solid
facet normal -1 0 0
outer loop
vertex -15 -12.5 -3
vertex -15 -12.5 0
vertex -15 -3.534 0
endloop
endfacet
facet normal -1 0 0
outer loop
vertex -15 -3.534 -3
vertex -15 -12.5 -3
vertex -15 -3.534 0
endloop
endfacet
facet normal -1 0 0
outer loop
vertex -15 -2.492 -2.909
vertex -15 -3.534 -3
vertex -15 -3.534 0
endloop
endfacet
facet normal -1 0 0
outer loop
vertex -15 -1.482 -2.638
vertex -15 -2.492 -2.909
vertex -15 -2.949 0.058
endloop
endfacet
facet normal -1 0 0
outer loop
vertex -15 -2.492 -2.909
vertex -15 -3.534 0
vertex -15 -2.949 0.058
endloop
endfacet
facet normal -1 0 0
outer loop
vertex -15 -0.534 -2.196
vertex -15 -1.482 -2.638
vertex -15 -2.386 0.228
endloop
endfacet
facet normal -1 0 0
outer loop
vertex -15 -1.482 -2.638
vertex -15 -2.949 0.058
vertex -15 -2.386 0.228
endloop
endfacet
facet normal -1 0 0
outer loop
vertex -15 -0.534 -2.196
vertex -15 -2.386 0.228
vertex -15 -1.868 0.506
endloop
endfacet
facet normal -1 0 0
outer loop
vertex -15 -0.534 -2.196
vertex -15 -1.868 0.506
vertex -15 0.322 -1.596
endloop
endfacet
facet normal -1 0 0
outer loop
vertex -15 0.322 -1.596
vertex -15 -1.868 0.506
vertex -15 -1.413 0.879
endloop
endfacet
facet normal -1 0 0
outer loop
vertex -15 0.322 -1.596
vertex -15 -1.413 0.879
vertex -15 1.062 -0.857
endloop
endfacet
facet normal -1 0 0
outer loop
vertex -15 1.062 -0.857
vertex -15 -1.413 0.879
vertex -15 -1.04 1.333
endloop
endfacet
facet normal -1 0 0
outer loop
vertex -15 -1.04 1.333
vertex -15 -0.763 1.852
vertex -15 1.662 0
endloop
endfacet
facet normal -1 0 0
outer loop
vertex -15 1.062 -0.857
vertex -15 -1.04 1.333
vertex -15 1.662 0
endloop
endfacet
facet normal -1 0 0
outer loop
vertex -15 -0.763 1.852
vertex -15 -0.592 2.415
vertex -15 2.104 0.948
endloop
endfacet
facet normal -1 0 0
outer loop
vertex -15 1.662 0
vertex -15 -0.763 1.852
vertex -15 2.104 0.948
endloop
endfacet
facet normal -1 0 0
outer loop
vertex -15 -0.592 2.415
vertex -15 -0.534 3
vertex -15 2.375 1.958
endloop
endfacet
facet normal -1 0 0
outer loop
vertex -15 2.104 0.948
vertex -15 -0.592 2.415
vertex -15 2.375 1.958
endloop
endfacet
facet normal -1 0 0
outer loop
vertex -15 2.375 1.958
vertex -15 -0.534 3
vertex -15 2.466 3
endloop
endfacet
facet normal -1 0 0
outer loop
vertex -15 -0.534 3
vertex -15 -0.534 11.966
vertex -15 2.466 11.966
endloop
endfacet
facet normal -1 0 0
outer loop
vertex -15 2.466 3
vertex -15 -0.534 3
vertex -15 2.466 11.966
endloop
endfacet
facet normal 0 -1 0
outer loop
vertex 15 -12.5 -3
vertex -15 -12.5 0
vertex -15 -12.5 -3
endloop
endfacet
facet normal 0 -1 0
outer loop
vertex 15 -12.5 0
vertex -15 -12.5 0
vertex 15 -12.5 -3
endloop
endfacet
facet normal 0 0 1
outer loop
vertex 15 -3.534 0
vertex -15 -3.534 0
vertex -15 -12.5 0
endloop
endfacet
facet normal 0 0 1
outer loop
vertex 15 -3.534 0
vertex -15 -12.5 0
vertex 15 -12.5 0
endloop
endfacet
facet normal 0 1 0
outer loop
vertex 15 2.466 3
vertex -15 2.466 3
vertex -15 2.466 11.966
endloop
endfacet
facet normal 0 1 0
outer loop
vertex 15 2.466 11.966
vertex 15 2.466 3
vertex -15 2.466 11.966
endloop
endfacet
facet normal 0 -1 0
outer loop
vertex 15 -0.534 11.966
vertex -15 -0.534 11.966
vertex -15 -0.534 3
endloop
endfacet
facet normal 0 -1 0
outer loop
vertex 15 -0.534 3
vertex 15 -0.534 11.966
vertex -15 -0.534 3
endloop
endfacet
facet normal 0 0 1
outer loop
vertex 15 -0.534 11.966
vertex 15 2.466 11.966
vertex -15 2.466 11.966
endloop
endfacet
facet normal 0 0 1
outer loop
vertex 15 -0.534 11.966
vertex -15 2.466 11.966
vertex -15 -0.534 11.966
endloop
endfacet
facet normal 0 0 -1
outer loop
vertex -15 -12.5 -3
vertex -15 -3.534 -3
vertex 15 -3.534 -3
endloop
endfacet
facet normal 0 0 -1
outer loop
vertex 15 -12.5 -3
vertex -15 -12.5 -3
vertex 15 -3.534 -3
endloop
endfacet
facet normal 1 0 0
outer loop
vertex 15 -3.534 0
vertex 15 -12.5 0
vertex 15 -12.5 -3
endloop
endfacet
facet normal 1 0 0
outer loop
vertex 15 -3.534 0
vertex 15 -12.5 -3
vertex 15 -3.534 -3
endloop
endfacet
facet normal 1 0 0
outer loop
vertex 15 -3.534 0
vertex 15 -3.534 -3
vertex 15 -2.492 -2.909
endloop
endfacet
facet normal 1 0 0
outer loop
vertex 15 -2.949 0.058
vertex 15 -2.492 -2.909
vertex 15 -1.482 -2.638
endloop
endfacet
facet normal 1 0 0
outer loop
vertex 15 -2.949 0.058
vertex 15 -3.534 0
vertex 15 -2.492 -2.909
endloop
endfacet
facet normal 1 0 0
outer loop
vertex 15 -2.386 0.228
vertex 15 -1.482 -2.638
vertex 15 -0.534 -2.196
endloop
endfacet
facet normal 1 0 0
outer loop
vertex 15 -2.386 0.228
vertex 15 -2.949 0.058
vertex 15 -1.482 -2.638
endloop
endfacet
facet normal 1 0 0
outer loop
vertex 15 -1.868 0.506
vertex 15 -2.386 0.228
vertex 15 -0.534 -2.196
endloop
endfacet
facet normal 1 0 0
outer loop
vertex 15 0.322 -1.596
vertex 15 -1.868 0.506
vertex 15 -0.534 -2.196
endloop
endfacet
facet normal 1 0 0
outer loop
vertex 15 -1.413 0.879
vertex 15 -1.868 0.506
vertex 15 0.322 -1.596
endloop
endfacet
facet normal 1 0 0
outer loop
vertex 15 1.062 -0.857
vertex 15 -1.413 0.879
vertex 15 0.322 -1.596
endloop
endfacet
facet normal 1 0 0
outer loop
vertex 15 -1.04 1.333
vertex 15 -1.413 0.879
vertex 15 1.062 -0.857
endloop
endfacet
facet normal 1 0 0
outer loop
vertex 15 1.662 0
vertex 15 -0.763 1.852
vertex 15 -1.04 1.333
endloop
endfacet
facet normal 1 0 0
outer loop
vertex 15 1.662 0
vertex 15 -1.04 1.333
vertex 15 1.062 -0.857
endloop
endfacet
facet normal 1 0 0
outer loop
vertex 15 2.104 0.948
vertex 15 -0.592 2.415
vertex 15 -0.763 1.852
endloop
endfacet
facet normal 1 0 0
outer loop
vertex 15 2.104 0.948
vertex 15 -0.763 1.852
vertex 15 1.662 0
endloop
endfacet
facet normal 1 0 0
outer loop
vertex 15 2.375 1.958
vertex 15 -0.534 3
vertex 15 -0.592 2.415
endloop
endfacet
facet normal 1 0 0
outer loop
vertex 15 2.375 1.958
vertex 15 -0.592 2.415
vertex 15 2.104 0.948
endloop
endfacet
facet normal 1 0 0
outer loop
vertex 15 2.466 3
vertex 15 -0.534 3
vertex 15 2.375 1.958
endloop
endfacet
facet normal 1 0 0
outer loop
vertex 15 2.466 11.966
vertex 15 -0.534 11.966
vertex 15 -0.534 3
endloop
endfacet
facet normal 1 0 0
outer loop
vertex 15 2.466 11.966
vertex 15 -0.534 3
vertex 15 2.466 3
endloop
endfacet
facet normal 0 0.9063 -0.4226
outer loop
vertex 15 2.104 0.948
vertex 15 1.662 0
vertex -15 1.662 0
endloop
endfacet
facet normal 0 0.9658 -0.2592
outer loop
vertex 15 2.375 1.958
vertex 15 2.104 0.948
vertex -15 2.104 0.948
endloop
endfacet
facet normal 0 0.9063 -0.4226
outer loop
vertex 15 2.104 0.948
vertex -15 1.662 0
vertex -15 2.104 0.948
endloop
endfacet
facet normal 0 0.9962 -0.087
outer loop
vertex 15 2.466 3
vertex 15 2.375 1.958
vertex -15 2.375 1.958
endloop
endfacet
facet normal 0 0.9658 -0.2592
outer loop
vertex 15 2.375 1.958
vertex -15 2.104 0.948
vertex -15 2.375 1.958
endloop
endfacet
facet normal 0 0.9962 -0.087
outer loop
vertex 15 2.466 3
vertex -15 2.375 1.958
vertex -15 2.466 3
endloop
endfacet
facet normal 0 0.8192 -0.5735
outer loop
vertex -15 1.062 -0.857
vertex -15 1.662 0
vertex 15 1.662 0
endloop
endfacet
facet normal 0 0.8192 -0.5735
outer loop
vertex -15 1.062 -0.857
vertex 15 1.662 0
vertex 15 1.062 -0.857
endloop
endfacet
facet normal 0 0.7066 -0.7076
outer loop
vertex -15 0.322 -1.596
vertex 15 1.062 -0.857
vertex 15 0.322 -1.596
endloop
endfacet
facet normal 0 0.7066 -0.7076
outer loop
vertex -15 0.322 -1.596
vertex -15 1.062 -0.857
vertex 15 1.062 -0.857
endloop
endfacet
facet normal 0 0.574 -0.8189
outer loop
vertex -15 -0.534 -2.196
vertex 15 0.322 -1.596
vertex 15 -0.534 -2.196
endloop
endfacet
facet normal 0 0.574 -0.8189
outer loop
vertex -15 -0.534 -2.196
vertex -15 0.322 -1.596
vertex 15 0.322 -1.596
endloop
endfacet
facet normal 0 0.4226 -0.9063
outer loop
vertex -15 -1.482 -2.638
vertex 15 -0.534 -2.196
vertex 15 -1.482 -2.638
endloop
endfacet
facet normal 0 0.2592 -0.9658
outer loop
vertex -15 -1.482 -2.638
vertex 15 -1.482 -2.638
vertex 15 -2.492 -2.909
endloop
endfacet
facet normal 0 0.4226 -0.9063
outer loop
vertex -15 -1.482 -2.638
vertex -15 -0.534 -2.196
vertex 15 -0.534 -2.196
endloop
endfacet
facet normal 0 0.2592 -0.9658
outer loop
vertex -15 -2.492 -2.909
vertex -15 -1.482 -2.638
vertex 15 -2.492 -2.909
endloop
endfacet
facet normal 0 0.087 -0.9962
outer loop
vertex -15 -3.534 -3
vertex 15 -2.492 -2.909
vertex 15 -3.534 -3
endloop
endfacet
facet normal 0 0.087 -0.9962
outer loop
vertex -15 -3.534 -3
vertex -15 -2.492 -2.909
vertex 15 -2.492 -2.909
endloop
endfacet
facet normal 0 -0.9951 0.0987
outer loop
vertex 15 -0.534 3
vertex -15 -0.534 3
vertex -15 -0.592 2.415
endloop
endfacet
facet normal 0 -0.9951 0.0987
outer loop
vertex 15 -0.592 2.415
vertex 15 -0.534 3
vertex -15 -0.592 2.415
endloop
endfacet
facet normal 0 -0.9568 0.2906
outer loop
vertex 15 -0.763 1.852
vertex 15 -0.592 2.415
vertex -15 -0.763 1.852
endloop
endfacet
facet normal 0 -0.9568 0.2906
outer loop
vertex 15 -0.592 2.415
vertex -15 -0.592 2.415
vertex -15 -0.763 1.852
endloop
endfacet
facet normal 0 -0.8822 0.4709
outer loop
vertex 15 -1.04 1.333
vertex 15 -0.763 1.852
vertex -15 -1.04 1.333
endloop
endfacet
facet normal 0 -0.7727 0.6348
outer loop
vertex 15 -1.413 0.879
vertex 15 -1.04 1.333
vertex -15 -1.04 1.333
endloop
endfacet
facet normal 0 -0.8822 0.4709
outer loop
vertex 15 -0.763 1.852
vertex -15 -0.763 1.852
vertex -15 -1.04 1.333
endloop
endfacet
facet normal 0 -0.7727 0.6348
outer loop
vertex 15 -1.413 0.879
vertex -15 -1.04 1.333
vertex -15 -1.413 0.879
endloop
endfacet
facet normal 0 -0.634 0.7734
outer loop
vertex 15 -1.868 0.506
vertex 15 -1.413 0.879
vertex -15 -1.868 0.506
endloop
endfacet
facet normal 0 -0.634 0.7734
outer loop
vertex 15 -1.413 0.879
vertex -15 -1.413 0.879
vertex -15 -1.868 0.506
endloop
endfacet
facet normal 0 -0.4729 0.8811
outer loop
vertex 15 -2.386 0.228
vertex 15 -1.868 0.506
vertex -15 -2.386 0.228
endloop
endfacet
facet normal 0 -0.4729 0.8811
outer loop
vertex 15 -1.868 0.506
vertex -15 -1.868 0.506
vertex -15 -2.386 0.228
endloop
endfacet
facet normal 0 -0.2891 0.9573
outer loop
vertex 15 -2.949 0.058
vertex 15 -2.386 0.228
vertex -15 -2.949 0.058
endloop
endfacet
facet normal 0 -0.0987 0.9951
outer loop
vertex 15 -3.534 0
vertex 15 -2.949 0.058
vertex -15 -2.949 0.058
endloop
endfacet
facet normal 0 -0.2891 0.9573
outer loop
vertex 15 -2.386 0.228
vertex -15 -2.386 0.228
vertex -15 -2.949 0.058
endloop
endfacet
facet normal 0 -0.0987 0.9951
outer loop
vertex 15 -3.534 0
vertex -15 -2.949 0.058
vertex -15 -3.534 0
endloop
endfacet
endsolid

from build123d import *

# Parameters (mm, degrees)
SKETCH1_W              = 30
SKETCH1_H              = 25
BASE_FLANGE1_DEPTH     = 3
SKETCHED_START         = -15
SKETCHED_BEND1_DEPTH   = 30
SKETCHED_BEND1_2_DEPTH = 30


# Read off the part's stored shape, not the designer's step: Sketched Bend1
# Sheet-metal steps are written as plain solids
with BuildPart() as part:
    # Sketch1 → Base-Flange1 (new body)
    with BuildSketch(Plane.XY):
        Rectangle(SKETCH1_W, SKETCH1_H)
    extrude(amount=-BASE_FLANGE1_DEPTH)

    # Sketched Bend1 outline → Sketched Bend1 (cut)
    with BuildSketch(Plane.YZ.offset(SKETCHED_START)):
        with BuildLine():
            Line((12.5, 0), (1.661860688, 0))
            ThreePointArc((1.661860688, 0), (-0.534291735, -2.196152423), (-3.534291735, -3))
            Line((-3.534291735, -3), (12.5, -3))
            Line((12.5, -3), (12.5, 0))
        make_face()
    extrude(amount=SKETCHED_BEND1_DEPTH, mode=Mode.SUBTRACT)

    # Sketched Bend1 2 outline → Sketched Bend1 2 (add)
    with BuildSketch(Plane.YZ.offset(SKETCHED_START)):
        with BuildLine():
            Line((2.465708265, 3), (2.465708265, 11.965708265))
            Line((2.465708265, 11.965708265), (-0.534291735, 11.965708265))
            Line((-0.534291735, 11.965708265), (-0.534291735, 3))
            ThreePointArc((-0.534291735, 3), (-1.412971392, 0.878679657), (-3.534291735, 0))
            Line((-3.534291735, 0), (1.661860688, 0))
            ThreePointArc((1.661860688, 0), (2.261263223, 1.447085729), (2.465708265, 3))
        make_face()
    extrude(amount=SKETCHED_BEND1_2_DEPTH)


solid = part.part
